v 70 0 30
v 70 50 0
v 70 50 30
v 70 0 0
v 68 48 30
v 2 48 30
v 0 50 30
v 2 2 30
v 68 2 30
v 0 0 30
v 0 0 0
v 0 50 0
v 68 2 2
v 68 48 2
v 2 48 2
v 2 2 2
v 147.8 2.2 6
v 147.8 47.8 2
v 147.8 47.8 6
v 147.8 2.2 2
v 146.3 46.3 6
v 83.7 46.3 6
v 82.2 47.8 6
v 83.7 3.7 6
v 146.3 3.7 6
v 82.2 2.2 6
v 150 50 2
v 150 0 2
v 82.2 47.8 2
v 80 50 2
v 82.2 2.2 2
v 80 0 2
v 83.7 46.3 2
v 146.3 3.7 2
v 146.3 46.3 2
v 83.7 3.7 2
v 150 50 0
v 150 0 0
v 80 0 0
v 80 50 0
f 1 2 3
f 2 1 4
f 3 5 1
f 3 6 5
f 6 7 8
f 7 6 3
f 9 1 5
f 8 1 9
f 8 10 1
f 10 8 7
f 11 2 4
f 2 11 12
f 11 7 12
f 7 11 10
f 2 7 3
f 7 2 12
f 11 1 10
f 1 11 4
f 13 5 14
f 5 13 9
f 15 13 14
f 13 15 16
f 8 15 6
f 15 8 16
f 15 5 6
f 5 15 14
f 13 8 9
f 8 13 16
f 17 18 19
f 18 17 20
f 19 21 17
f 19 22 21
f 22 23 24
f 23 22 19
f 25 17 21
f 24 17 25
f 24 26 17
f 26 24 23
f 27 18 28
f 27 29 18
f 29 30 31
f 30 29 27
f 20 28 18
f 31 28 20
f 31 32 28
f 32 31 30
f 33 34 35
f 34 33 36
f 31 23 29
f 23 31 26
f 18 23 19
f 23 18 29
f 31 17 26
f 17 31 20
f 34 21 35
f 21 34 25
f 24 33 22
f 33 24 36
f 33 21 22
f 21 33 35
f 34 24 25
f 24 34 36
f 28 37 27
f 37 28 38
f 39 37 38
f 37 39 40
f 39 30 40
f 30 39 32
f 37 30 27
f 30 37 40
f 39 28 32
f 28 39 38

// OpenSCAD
// Two-part electronics enclosure: Box and Lid
// Designed for FDM printing.

// --- Dimensions ---
box_l      = 70.0;    // Box length (X)
box_w      = 50.0;    // Box width (Y)
box_h      = 30.0;    // Box height (Z)
wall_t     = 2.0;     // Wall thickness
floor_t    = 2.0;     // Floor thickness

lid_plate_t = 2.0;    // Lid plate thickness
lid_lip_h   = 4.0;    // Lip height
lid_lip_t   = 1.5;    // Lip wall thickness
lid_lip_l   = 65.6;   // Lip outer length (X)
lid_lip_w   = 45.6;   // Lip outer width (Y)

// Spacing between parts on the print bed
gap = 10.0;

$fn = 64;

// --- Part 1: The Box ---
// Rests on XY plane at Z=0
module box() {
    difference() {
        // Main outer body
        cube([box_l, box_w, box_h]);
        
        // Hollow interior
        // We subtract the floor and walls to create the cavity
        translate([wall_t, wall_t, floor_t])
            cube([box_l - 2 * wall_t, box_w - 2 * wall_t, box_h]);
    }
}

// --- Part 2: The Lid ---
// Printed upside down (plate on bed, lip pointing up in -Z, 
// but user requested "lid on the +X side" and "printed upside down" 
// meaning the flat plate is at Z=0 and the lip is at Z > 0, 
// but the lid is flipped so the lip is the part that meets the box).
// To print "upside down" for a lid with a lip, the plate sits on the bed 
// and the lip grows upwards.
module lid() {
    union() {
        // The flat plate
        cube([box_l, box_w, lid_plate_t]);
        
        // The rectangular lip
        // Centered on the plate
        translate([(box_l - lid_lip_l) / 2, (box_w - lid_lip_w) / 2, lid_plate_t])
            difference() {
                // Outer profile of the lip
                cube([lid_lip_l, lid_lip_w, lid_lip_h]);
                
                // Inner profile of the lip (to make it a hollow wall)
                translate([lid_lip_t, lid_lip_t, -0.01])
                    cube([lid_lip_l - 2 * lid_lip_t, lid_lip_w - 2 * lid_lip_t, lid_lip_h + 0.02]);
            }
    }
}

// --- Assembly / Layout ---

// Part 1: The Box
translate([0, 0, 0])
    box();

// Part 2: The Lid
// Placed on the +X side of the box with a 10mm gap.
// The box occupies X from 0 to 70. 
// The gap is 10.
// The lid starts at X = 70 + 10 = 80.
translate([box_l + gap, 0, 0])
    lid();
